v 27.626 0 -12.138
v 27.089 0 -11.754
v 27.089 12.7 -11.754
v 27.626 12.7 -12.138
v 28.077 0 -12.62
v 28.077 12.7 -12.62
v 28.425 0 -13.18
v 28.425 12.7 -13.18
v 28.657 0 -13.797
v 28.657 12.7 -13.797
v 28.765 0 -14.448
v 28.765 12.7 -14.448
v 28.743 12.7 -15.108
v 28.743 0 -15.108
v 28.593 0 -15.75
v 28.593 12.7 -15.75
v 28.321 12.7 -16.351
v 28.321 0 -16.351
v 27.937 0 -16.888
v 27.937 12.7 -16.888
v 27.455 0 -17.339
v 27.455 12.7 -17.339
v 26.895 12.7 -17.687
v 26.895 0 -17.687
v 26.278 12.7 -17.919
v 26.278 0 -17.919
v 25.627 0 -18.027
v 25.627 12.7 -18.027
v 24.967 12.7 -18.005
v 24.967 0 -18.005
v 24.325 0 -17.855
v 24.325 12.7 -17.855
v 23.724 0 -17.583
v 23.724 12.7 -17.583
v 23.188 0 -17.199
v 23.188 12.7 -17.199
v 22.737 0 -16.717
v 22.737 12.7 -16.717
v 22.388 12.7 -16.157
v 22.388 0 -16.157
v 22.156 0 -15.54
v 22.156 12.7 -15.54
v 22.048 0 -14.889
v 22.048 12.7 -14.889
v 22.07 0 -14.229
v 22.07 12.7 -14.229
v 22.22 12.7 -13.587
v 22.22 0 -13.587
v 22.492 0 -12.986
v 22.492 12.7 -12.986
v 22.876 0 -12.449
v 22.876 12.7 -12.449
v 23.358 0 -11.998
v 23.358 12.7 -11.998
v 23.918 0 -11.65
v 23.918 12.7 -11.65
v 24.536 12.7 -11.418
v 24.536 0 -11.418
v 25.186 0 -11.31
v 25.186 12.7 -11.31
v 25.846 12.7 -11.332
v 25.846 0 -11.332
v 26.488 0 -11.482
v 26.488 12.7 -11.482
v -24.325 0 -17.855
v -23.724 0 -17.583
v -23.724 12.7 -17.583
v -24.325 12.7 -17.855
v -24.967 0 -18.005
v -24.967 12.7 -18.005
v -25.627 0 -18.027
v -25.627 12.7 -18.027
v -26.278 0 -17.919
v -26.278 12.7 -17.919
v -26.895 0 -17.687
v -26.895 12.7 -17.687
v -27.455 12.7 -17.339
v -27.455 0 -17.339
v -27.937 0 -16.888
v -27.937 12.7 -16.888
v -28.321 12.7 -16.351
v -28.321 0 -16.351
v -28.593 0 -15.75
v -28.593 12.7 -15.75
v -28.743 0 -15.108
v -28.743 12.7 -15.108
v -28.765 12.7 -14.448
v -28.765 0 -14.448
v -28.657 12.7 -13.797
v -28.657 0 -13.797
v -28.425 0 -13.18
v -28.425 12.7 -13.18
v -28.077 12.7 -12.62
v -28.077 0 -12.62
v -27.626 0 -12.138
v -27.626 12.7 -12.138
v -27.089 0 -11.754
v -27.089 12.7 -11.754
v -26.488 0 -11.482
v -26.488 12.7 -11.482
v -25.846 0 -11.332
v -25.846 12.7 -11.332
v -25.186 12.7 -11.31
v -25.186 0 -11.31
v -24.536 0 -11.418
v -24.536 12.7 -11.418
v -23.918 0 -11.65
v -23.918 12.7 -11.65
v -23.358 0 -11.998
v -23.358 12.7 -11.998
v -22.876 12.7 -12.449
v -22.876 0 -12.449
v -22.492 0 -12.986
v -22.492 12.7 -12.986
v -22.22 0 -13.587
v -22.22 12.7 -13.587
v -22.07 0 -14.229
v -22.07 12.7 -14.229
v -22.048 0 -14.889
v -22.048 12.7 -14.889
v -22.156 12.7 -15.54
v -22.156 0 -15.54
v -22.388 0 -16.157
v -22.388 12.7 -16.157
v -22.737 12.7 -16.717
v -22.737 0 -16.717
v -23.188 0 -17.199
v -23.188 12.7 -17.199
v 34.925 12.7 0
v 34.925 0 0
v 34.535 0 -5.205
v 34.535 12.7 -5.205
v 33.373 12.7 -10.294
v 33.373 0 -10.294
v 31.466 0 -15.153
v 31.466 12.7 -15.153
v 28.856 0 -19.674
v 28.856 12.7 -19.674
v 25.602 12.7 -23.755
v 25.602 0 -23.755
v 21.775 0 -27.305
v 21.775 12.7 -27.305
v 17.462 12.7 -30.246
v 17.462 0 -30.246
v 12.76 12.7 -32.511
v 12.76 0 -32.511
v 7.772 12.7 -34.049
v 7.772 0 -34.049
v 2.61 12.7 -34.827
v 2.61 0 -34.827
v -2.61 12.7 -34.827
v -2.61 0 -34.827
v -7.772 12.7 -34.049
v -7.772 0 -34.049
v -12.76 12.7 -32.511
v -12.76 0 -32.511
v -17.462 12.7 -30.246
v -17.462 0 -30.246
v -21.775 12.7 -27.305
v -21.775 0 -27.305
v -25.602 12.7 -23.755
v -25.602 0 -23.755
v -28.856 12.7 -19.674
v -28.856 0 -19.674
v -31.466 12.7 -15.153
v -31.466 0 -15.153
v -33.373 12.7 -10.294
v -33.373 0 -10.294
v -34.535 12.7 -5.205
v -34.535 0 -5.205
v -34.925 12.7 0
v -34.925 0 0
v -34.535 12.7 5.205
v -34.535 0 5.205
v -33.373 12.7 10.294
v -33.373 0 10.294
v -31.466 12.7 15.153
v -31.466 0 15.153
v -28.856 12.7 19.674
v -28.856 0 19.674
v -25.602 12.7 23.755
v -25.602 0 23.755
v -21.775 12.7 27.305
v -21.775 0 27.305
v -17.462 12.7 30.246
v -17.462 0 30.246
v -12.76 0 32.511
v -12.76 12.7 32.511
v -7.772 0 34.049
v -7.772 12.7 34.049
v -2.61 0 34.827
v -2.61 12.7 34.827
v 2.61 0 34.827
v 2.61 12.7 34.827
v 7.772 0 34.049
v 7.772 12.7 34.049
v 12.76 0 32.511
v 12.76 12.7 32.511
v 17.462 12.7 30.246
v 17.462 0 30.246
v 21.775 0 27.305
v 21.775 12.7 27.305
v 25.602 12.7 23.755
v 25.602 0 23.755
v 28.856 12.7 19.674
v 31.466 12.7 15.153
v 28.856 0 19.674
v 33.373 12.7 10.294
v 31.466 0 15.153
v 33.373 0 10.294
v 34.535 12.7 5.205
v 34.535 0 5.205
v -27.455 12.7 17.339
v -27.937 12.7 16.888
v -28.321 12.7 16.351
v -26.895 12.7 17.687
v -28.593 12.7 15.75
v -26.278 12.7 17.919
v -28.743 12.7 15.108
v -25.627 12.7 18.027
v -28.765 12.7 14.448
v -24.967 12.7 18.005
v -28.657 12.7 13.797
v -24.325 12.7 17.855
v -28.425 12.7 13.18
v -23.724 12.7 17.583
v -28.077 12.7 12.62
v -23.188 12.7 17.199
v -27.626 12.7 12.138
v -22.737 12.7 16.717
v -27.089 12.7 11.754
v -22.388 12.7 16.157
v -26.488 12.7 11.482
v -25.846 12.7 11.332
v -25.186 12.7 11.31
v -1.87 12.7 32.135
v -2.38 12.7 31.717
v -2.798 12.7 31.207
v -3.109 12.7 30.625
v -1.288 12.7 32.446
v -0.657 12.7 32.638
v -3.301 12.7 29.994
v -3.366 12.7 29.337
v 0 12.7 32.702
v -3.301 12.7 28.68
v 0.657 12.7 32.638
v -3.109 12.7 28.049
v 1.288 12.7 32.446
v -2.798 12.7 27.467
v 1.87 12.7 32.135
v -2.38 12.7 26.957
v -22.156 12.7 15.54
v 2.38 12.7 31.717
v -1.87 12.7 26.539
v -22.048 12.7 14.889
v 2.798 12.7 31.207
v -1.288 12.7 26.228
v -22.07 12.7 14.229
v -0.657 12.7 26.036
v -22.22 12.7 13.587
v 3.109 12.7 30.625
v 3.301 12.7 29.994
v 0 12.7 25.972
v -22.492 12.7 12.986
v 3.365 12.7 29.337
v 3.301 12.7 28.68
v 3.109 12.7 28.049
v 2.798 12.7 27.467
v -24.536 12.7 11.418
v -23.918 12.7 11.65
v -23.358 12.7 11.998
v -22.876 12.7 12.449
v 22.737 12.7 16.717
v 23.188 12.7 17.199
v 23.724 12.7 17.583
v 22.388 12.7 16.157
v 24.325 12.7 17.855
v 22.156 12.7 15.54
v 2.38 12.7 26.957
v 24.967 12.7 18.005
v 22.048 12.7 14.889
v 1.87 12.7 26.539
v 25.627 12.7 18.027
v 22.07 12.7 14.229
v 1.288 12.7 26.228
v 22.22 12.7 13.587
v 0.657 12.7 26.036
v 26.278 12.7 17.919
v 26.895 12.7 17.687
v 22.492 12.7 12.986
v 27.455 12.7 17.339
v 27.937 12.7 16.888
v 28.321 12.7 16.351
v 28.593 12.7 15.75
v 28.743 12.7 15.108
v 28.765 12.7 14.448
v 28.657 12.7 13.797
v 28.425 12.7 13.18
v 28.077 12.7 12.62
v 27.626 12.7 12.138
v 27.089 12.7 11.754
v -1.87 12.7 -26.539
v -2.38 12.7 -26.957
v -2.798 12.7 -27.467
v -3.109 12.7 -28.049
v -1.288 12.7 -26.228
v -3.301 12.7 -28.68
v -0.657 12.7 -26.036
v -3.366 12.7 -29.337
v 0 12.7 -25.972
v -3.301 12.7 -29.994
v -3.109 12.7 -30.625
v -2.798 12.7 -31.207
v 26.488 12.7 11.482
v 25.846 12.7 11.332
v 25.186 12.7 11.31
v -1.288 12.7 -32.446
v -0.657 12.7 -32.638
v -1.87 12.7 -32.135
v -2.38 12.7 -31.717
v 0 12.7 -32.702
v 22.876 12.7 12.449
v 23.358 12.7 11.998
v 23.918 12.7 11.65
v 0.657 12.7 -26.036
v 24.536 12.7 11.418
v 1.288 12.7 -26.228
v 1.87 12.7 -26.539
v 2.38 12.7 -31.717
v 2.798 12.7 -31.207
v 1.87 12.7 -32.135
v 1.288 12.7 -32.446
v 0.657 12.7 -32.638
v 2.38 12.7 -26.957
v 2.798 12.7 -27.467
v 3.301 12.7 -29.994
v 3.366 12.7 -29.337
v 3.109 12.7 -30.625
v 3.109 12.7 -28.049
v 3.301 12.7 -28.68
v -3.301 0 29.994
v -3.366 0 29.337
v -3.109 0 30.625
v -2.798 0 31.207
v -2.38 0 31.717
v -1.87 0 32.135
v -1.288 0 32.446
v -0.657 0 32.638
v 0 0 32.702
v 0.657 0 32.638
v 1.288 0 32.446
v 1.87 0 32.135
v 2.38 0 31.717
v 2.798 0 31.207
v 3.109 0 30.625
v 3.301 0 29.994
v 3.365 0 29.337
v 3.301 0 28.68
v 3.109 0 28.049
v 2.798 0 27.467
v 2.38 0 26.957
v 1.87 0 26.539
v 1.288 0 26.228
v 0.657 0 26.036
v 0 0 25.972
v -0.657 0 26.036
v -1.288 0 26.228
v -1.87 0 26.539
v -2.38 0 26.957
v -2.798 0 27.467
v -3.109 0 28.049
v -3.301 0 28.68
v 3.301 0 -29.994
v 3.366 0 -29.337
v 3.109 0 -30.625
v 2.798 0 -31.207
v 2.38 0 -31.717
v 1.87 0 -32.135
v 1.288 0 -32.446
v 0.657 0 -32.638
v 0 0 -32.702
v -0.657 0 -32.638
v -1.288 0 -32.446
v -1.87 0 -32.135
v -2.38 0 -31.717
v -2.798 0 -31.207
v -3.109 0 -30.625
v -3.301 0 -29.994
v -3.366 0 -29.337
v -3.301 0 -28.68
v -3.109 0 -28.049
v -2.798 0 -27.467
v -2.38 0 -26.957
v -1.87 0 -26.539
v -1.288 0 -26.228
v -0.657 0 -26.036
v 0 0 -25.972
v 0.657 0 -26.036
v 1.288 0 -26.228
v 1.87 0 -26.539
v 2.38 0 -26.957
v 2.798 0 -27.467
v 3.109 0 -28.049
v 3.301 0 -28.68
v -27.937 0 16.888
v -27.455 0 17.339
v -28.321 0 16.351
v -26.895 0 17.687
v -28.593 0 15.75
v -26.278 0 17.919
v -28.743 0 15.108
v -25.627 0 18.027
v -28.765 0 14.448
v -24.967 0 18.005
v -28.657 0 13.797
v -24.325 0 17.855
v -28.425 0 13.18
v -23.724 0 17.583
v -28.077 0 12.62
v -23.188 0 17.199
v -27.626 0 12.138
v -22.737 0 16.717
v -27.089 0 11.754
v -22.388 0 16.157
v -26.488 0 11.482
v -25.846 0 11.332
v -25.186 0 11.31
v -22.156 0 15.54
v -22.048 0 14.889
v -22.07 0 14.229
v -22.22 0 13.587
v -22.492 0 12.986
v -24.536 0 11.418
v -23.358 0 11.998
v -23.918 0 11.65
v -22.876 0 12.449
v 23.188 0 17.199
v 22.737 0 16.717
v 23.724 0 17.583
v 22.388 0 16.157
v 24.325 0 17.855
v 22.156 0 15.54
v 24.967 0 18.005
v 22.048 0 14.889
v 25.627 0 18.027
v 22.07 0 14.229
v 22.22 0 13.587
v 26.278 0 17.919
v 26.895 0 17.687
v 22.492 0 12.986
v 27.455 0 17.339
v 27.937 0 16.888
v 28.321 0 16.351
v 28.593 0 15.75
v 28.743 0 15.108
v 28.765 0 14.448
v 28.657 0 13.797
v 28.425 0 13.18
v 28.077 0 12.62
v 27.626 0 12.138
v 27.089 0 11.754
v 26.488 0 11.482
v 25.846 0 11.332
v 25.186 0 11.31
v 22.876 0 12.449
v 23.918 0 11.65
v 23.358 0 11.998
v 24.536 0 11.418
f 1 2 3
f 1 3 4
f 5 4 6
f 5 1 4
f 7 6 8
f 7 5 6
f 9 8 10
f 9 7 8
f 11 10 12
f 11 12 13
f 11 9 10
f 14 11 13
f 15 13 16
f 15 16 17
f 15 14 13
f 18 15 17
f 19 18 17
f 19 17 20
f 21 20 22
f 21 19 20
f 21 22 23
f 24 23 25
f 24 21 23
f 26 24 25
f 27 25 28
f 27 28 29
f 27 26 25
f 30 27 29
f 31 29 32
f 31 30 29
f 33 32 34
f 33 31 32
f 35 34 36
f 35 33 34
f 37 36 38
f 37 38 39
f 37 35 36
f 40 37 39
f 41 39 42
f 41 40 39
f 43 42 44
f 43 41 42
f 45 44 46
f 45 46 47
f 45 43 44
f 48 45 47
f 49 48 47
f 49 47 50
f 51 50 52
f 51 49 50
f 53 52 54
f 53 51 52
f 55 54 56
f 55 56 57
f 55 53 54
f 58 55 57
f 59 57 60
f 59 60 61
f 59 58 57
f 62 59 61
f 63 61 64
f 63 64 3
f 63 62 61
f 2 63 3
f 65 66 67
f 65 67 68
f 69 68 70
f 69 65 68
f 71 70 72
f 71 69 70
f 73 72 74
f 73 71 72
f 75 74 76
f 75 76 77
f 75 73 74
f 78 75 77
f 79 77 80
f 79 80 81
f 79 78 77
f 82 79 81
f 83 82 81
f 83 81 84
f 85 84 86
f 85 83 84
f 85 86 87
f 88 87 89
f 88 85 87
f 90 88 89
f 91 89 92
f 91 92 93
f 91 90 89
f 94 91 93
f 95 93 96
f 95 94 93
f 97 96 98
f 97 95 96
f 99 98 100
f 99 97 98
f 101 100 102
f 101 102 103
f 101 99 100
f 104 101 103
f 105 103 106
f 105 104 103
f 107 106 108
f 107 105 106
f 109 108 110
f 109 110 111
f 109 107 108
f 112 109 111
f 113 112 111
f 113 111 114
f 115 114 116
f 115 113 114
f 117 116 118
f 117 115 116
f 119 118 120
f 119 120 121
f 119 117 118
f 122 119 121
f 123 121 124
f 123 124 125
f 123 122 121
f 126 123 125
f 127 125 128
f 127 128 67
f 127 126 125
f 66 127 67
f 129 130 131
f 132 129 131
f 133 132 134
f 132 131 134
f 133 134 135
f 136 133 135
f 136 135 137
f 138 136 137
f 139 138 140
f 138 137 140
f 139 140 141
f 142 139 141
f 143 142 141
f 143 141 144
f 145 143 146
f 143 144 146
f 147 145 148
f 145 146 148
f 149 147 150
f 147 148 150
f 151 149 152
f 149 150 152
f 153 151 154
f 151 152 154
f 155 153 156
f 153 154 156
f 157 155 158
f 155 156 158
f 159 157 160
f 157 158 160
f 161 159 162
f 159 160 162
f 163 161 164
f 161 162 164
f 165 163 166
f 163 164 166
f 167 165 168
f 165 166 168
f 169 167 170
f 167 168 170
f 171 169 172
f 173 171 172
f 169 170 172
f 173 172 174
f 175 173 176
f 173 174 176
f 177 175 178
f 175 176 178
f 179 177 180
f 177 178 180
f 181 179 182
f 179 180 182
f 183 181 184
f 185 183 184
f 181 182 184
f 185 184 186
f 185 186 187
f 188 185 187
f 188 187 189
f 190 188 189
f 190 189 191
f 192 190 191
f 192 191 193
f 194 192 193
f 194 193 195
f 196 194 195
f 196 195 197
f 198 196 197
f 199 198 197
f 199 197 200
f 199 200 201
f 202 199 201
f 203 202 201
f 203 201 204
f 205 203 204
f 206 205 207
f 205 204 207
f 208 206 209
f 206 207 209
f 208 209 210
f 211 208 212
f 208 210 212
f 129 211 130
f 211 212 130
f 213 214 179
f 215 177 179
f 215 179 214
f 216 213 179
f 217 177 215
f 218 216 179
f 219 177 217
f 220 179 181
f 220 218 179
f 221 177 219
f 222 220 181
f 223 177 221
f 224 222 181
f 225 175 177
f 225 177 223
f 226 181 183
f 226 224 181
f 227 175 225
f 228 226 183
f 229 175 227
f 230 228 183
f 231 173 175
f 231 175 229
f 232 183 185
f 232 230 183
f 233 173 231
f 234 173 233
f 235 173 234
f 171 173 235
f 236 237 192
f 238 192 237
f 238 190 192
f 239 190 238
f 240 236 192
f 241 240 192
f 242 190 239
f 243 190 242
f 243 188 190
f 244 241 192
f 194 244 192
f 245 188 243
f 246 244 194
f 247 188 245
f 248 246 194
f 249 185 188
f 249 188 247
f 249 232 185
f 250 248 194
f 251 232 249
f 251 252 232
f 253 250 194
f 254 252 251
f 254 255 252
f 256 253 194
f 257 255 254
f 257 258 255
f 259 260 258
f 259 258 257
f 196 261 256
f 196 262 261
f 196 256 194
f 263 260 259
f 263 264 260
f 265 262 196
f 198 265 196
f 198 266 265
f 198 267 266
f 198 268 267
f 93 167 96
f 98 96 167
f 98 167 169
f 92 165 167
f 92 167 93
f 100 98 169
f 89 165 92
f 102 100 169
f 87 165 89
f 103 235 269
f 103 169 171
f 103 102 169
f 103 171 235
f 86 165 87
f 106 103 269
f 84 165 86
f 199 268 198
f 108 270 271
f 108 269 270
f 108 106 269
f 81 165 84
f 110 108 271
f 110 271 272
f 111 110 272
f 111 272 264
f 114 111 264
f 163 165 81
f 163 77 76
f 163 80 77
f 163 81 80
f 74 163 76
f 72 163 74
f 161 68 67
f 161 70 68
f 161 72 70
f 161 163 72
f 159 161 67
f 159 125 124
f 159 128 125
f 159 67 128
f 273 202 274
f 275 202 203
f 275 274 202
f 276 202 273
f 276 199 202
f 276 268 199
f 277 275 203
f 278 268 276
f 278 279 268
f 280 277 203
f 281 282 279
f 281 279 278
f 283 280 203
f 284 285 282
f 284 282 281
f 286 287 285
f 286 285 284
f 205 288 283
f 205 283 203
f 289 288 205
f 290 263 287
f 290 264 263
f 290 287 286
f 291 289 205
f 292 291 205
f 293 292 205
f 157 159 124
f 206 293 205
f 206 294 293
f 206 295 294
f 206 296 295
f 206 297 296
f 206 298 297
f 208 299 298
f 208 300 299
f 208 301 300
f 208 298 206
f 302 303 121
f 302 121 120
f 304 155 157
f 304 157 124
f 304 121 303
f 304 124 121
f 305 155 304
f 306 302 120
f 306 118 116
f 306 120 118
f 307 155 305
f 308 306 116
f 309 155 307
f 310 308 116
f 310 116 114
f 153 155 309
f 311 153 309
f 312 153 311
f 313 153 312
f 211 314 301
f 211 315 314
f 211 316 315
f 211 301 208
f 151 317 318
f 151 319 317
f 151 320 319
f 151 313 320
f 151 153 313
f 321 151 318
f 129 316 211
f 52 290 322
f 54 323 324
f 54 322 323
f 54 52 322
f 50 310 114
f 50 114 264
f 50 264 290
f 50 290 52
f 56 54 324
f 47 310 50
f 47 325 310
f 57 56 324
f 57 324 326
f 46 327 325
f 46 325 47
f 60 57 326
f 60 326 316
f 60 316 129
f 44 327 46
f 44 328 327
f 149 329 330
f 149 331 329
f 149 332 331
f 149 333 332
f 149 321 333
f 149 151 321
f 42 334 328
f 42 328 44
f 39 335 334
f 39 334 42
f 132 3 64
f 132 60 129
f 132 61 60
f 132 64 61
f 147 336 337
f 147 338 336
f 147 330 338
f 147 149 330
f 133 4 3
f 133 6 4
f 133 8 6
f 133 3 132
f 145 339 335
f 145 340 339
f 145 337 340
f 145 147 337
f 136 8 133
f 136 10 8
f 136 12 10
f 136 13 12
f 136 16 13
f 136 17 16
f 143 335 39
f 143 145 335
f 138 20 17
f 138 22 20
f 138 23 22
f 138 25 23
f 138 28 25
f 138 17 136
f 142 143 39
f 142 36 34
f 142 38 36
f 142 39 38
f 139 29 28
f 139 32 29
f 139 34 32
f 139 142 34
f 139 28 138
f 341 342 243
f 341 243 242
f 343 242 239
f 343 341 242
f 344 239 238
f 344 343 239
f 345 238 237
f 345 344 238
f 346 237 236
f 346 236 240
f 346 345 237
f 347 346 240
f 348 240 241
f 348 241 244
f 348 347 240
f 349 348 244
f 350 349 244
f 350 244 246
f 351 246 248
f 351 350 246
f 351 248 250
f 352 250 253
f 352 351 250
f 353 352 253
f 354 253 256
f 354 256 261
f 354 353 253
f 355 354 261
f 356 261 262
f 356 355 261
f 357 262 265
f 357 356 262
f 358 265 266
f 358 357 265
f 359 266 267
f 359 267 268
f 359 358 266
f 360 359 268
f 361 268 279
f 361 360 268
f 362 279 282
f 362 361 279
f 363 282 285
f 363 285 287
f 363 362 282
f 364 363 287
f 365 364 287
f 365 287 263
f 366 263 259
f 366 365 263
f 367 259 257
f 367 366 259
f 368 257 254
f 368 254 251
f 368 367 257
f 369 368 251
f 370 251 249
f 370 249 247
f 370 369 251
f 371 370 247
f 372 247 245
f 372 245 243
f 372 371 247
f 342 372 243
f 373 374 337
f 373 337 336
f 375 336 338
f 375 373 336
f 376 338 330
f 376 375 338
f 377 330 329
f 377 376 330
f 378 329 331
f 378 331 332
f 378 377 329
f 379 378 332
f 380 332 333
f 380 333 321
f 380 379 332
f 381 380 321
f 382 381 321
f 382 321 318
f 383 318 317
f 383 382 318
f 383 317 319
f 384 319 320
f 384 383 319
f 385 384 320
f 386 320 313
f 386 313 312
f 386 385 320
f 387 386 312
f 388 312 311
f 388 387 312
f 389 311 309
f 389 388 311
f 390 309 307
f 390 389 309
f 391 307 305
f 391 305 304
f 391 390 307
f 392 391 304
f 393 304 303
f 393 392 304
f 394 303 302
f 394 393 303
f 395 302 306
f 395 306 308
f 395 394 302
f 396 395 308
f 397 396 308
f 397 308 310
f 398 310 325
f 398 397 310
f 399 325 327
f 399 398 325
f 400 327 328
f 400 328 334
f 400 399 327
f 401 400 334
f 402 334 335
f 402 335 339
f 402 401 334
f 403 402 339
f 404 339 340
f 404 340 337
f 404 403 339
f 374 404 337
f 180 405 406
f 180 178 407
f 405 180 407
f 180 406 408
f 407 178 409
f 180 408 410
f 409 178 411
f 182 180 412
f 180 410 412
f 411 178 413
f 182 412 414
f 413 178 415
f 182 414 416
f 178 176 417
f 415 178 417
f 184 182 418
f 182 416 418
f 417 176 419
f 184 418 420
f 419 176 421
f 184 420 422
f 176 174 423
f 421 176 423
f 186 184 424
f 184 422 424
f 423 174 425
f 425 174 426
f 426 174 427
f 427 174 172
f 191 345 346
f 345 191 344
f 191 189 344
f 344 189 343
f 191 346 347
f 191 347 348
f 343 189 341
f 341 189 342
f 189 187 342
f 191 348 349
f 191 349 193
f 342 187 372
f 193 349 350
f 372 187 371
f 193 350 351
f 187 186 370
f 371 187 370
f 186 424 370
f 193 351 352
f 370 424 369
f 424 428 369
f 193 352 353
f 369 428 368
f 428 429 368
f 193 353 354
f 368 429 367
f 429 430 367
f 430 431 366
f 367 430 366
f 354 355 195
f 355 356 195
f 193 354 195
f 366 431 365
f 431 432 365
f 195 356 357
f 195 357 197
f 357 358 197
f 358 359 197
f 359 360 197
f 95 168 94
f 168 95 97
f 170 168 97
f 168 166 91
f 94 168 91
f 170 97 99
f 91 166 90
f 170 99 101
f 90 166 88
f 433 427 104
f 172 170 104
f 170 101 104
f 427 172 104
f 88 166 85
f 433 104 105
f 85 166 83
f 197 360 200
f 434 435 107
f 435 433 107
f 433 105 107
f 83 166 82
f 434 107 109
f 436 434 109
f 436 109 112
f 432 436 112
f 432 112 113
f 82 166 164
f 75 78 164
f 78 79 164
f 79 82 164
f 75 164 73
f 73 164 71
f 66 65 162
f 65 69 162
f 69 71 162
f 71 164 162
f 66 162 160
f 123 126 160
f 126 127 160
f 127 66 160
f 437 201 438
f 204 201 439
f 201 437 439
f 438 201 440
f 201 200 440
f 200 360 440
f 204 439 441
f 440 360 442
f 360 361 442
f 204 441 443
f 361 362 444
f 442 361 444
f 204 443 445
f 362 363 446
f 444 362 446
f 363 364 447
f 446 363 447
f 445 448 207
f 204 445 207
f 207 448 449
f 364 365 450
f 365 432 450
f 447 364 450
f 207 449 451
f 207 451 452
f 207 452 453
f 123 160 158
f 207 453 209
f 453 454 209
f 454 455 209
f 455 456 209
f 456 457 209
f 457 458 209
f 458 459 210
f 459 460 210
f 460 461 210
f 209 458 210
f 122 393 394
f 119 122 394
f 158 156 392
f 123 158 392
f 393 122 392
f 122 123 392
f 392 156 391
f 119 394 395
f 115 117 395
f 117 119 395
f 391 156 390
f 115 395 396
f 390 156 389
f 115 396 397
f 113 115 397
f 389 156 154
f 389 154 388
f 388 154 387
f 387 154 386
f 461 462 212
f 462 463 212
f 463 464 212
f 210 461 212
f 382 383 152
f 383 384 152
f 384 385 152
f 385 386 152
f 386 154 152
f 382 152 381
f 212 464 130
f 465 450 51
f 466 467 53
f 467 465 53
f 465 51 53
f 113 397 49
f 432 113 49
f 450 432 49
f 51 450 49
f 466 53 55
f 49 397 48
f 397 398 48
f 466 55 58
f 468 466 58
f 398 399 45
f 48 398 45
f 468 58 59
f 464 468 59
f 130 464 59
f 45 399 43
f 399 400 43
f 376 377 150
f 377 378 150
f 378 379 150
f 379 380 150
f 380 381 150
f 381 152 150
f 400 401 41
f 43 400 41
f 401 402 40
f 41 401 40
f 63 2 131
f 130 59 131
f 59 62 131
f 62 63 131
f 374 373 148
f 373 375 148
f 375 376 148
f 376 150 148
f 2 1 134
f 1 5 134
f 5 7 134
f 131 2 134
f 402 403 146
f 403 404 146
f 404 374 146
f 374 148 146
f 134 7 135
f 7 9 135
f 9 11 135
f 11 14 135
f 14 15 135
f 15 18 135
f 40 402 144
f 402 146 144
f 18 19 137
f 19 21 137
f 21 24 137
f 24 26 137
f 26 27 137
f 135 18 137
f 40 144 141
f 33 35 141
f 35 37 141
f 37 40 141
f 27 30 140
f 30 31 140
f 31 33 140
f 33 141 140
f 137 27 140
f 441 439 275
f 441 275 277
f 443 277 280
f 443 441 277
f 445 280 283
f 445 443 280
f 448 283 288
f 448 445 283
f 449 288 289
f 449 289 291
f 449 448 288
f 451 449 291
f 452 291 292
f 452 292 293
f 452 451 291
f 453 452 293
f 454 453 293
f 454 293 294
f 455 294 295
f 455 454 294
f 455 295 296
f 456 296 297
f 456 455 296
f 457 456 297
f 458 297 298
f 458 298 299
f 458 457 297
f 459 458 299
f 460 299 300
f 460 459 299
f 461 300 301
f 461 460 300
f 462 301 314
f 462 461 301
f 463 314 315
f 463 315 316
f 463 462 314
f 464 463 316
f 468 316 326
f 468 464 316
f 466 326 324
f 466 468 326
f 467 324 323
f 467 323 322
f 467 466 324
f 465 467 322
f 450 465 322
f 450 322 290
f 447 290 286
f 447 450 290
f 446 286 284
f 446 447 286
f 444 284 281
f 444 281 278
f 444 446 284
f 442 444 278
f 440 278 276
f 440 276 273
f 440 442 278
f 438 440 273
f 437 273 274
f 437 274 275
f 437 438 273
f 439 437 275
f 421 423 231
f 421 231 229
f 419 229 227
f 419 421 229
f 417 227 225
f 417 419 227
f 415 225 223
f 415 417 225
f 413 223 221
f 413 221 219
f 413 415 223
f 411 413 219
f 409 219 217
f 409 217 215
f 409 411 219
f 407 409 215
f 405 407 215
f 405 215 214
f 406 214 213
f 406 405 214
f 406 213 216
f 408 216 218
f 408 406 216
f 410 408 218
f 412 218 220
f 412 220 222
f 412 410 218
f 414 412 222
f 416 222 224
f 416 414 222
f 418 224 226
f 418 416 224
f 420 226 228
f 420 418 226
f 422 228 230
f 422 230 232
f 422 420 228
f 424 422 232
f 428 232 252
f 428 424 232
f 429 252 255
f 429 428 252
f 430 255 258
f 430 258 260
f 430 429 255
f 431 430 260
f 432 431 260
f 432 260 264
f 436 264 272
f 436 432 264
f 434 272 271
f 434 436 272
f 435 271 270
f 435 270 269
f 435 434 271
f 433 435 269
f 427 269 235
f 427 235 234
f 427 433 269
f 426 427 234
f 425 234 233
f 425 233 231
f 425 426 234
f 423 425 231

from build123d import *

# Parameters (mm, degrees)
SKETCH1_R          = 34.925
EXTRUDE1_DEPTH     = 12.7
SKETCH3_R          = 3.3655
CUT_EXTRUDE2_DEPTH = 12.7
CIRPATTERN1_COUNT  = 6


with BuildPart() as part:
    # Sketch1 → Extrude1 (new body)
    with BuildSketch(Plane(origin=(0, 0, 0), x_dir=(1, 0, 0), z_dir=(0, 1, 0))):
        Circle(SKETCH1_R)
    extrude(amount=EXTRUDE1_DEPTH)

    # Sketch3 → Cut-Extrude2 (cut)
    with BuildSketch(Plane(origin=(0, 0, 0), x_dir=(1, 0, 0), z_dir=(0, 1, 0))):
        with Locations((0, 29.337)):
            Circle(SKETCH3_R)
    cut_extrude2 = extrude(amount=CUT_EXTRUDE2_DEPTH, mode=Mode.SUBTRACT)

    # CirPattern1: Cut-Extrude2 ×6 about axis
    cirpattern1_axis = Axis((0, 0, 0), (0, 1, 0))
    for i in range(1, CIRPATTERN1_COUNT):
        add(cut_extrude2.rotate(cirpattern1_axis, i * 360 / CIRPATTERN1_COUNT), mode=Mode.SUBTRACT)


solid = part.part
